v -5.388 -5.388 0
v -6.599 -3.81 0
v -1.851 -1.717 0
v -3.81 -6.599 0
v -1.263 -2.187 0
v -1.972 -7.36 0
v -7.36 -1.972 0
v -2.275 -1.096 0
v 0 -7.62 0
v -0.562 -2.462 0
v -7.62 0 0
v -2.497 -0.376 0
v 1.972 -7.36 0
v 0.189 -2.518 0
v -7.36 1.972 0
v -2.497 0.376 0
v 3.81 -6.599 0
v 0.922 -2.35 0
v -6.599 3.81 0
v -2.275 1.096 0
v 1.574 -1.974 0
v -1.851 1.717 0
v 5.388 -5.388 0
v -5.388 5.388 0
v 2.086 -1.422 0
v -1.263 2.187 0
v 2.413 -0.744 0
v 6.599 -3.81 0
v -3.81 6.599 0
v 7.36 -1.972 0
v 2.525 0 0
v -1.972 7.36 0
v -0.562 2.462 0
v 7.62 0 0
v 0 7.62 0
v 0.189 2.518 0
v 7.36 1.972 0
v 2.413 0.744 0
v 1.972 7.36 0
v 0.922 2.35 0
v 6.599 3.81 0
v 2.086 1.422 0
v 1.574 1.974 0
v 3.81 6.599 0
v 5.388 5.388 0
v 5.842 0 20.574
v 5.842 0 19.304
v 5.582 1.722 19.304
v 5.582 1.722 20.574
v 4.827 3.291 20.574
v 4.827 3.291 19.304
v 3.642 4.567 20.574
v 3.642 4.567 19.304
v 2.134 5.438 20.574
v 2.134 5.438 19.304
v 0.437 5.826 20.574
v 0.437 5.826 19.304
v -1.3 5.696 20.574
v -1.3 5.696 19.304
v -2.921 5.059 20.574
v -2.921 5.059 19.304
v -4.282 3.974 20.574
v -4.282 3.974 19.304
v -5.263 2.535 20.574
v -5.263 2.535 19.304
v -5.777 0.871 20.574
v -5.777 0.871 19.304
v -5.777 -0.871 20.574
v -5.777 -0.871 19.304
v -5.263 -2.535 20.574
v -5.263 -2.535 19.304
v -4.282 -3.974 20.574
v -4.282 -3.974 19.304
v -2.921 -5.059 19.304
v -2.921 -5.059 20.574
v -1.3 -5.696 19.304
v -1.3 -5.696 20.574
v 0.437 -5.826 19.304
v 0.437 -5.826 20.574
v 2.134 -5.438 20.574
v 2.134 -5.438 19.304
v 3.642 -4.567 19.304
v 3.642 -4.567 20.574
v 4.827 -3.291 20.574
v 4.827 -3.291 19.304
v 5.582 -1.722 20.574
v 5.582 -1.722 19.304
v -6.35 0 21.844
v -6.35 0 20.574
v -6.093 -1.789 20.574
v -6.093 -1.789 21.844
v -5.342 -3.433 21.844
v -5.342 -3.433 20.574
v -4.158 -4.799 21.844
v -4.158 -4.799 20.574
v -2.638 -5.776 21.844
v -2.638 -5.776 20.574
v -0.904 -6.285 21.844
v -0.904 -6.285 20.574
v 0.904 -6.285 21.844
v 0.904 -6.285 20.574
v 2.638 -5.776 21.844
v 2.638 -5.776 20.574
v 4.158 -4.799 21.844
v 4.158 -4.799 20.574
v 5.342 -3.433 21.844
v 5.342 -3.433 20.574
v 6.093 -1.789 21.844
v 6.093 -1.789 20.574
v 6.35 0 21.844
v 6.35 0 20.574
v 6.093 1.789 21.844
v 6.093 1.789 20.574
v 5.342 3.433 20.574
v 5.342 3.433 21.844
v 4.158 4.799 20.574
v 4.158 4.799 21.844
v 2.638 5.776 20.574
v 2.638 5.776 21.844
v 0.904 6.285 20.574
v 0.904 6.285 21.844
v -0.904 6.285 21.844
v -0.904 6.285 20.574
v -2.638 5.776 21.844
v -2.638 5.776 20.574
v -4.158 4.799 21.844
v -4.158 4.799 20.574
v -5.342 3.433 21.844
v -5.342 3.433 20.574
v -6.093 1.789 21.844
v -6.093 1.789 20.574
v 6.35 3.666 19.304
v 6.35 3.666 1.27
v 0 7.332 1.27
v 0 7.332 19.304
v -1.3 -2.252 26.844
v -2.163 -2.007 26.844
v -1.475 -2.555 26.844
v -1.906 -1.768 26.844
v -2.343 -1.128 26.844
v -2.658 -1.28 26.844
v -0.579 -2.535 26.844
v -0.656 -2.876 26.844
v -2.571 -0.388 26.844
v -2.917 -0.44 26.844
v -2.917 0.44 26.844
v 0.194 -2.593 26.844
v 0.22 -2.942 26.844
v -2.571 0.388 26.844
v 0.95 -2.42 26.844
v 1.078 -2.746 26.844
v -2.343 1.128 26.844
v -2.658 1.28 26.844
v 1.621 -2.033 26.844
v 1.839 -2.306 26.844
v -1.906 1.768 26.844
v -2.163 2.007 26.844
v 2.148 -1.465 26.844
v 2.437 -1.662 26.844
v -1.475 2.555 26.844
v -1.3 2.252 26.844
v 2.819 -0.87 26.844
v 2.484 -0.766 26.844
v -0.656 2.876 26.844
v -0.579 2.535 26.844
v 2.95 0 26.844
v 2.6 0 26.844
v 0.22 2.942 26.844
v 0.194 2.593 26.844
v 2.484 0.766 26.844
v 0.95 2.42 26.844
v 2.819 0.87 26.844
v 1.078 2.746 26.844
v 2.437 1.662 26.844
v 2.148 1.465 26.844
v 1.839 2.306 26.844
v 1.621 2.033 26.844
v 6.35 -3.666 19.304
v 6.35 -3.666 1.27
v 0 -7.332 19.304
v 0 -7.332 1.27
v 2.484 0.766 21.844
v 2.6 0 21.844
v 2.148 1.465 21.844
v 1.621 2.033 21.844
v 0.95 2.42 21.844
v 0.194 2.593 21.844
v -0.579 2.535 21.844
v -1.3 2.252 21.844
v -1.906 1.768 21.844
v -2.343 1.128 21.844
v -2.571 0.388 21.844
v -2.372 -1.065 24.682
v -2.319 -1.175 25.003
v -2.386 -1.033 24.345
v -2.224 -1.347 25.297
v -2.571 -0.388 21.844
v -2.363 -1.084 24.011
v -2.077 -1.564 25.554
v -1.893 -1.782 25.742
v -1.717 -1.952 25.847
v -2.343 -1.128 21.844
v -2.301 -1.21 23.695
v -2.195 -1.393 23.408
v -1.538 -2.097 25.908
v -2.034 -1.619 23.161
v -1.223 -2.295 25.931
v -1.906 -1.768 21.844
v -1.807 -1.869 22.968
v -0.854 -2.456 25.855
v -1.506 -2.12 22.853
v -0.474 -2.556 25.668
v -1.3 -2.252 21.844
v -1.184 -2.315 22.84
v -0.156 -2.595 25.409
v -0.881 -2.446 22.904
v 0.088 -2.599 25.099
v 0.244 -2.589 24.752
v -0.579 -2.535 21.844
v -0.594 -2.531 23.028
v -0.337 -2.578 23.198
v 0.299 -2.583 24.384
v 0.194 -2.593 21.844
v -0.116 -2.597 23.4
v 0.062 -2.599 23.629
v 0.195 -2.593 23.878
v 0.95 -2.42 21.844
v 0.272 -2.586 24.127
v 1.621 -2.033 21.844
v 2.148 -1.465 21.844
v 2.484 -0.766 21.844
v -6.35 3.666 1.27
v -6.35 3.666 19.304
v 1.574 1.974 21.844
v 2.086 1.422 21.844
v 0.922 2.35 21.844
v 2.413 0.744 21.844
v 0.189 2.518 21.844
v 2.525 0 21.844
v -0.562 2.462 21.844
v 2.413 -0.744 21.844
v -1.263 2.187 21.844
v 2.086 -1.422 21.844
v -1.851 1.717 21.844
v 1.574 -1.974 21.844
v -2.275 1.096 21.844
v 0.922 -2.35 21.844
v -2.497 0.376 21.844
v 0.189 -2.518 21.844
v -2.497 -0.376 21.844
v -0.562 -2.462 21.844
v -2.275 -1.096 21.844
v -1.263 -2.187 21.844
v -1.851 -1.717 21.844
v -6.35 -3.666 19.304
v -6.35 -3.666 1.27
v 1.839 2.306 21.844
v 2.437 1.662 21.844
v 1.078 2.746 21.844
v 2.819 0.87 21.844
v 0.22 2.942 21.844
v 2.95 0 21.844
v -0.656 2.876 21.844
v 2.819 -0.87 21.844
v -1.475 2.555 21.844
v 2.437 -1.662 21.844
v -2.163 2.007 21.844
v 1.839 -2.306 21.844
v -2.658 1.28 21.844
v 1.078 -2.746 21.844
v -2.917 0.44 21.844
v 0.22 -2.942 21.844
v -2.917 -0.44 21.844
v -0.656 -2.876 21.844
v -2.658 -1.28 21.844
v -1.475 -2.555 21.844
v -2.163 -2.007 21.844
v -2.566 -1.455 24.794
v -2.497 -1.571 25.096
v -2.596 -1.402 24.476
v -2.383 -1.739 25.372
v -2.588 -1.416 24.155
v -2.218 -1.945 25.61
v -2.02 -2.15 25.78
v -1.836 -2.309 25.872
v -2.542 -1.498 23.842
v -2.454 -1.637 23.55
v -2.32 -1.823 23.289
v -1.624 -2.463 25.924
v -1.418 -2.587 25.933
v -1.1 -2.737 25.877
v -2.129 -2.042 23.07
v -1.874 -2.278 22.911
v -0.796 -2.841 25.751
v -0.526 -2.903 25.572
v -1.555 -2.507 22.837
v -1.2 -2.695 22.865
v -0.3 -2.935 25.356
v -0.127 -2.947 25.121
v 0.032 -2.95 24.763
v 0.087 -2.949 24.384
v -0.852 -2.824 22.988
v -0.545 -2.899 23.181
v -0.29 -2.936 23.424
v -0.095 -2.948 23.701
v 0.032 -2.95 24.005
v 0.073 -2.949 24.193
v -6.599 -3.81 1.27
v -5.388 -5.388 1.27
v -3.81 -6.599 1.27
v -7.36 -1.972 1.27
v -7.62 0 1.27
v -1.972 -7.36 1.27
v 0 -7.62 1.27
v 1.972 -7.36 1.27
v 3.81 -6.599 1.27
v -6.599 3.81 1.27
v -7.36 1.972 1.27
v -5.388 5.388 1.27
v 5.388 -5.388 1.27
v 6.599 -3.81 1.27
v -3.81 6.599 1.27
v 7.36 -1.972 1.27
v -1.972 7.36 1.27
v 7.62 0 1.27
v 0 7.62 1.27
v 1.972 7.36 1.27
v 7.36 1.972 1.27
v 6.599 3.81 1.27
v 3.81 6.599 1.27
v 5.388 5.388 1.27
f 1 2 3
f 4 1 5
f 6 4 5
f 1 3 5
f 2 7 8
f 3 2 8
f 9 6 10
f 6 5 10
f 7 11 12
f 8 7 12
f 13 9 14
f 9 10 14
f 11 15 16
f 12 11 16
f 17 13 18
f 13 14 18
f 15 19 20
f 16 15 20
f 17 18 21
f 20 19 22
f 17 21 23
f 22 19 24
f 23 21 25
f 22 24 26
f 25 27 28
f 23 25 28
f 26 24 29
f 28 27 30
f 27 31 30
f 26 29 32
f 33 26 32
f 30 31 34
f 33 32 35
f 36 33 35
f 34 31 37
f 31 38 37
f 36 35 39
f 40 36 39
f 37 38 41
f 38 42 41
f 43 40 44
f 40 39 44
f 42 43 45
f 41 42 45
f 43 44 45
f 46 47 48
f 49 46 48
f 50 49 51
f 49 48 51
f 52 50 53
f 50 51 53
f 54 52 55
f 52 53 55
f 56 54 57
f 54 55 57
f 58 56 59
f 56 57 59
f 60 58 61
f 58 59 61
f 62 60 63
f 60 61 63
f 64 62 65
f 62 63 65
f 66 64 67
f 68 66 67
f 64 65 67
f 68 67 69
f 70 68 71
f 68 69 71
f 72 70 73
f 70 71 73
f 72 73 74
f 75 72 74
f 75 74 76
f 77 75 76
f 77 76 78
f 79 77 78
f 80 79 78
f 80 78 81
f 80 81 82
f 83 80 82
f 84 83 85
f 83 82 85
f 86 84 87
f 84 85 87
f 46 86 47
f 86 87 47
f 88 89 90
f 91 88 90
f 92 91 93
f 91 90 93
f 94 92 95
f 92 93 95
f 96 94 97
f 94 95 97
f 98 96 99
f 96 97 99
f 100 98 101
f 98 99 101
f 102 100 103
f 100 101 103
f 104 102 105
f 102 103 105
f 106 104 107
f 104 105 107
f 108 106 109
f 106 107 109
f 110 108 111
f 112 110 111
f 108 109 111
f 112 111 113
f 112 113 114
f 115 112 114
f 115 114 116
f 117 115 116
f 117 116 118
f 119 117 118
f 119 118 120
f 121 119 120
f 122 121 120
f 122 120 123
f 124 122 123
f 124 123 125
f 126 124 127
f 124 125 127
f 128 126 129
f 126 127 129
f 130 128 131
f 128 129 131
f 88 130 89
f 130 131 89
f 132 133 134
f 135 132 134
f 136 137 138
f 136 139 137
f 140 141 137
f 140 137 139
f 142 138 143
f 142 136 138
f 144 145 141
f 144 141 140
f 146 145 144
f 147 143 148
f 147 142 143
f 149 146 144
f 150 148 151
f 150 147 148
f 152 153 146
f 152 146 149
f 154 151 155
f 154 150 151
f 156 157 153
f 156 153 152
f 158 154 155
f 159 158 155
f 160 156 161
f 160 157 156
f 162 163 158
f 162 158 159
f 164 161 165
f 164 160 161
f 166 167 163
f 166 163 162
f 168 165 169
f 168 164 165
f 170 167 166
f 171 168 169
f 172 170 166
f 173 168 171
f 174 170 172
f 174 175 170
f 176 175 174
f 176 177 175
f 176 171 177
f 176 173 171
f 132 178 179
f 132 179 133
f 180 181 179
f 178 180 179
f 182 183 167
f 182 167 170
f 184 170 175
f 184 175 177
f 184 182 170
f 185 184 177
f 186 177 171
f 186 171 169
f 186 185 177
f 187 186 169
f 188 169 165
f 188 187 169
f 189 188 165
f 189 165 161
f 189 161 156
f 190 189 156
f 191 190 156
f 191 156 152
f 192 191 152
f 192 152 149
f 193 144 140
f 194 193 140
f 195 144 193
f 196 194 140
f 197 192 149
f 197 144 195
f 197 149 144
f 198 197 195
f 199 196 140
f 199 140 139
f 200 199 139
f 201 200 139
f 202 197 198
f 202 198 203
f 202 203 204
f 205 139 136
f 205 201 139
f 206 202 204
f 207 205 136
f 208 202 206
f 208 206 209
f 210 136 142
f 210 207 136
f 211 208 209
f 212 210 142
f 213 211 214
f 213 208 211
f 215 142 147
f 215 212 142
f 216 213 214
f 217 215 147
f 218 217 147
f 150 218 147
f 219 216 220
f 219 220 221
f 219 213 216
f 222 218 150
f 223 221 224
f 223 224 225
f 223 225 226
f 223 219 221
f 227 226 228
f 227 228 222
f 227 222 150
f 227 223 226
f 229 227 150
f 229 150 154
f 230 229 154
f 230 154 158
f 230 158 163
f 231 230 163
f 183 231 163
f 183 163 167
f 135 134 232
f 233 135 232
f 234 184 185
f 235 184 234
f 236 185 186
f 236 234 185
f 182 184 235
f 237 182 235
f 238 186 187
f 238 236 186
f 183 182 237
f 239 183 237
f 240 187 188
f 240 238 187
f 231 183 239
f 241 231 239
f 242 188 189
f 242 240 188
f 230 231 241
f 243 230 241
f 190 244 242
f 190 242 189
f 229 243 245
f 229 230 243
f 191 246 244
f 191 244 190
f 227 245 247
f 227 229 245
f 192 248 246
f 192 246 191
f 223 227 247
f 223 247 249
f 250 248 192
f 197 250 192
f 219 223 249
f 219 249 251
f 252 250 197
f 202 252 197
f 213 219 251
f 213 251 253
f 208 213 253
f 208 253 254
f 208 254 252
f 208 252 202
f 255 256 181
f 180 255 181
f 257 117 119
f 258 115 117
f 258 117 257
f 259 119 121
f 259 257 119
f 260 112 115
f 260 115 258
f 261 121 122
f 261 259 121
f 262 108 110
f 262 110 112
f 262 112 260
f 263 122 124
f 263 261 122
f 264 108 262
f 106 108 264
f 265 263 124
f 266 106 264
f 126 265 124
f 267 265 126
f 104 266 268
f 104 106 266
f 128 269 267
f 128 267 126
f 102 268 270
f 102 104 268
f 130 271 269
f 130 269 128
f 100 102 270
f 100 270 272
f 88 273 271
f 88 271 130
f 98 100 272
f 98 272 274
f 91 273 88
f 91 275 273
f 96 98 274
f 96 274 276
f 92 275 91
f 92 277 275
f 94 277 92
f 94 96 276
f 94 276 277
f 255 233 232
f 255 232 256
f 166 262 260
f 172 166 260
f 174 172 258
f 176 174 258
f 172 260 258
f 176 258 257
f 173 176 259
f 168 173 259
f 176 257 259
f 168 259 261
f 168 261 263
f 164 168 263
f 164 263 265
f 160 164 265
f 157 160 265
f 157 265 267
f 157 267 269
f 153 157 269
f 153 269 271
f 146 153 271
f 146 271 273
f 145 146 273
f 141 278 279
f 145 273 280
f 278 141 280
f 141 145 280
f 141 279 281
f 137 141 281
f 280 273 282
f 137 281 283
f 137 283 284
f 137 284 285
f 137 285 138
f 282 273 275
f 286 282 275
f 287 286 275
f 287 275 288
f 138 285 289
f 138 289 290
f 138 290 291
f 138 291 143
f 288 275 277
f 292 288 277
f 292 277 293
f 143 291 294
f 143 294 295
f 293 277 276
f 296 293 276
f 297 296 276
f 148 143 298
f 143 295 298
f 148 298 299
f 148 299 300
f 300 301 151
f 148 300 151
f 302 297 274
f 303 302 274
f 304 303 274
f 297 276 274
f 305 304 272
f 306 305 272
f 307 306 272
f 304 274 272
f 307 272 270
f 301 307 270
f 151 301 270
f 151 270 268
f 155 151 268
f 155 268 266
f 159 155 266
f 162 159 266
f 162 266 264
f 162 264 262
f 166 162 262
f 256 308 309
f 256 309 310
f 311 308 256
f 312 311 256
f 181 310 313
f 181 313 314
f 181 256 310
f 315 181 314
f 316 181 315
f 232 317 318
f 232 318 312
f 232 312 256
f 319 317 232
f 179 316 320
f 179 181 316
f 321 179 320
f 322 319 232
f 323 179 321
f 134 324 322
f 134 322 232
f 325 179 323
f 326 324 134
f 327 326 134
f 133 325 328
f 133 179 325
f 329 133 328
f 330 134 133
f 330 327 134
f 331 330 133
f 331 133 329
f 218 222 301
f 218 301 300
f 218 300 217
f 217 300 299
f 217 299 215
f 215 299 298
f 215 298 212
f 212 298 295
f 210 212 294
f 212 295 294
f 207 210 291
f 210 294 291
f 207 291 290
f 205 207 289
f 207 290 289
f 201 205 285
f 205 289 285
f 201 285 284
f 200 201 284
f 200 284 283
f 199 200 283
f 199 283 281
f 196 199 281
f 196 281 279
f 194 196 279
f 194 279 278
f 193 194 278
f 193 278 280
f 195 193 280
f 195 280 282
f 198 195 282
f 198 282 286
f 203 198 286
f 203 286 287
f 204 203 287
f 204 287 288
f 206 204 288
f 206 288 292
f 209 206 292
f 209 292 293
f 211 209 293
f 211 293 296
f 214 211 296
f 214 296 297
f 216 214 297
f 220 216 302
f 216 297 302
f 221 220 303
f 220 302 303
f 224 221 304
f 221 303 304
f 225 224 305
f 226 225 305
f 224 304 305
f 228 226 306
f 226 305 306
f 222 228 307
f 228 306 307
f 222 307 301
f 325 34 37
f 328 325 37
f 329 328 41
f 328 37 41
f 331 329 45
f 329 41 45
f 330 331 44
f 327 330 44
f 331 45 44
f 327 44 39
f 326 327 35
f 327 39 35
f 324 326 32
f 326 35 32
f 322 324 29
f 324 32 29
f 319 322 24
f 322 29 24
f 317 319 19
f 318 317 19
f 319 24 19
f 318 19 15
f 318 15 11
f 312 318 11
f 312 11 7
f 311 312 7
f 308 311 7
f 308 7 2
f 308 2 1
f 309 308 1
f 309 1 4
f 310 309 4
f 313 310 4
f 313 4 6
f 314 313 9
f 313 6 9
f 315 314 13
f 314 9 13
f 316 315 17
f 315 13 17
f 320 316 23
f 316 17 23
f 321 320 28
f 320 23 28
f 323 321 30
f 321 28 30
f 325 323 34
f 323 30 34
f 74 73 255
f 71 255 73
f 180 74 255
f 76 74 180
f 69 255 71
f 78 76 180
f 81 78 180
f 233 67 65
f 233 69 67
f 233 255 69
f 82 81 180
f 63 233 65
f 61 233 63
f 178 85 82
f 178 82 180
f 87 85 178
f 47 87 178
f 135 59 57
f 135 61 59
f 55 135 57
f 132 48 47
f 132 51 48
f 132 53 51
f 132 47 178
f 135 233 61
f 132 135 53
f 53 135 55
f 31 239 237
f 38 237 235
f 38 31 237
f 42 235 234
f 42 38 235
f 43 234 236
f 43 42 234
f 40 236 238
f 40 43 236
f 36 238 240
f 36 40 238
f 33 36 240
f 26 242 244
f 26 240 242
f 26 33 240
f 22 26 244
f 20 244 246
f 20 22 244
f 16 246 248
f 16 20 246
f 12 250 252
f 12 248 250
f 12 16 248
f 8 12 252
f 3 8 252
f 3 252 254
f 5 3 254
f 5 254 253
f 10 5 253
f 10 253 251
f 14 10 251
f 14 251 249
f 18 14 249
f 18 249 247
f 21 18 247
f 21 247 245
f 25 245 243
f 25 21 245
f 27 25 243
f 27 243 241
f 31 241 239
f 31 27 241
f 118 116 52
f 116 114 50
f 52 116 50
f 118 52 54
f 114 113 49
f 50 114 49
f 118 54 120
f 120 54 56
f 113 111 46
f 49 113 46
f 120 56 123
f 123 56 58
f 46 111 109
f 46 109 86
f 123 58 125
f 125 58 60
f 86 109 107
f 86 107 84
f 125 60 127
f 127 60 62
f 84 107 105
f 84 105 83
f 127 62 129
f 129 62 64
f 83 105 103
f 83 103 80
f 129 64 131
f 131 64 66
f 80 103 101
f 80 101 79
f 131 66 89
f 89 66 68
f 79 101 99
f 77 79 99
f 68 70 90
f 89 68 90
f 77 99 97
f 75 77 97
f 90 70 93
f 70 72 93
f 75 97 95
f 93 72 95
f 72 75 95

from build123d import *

# Parameters (mm, degrees)
BOSS_EXTRU_1_DEPTH      = 19.304
ESQUISSE2_R             = 7.62
BOSS_EXTRU_2_DEPTH      = 1.27
ESQUISSE3_R             = 5.842
BOSS_EXTRU_3_DEPTH      = 1.27
ESQUISSE4_R             = 6.35
BOSS_EXTRU_4_DEPTH      = 1.27
ESQUISSE5_R             = 2.525
ENL_V_MAT_EXTRU_1_DEPTH = 25.357527297
ESQUISSE7_R             = 2.95
ESQUISSE7_R_2           = 2.6
BOSS_EXTRU_6_DEPTH      = 5
ESQUISSE8_R             = 1.55
ENL_V_MAT_EXTRU_2_DEPTH = 5


with BuildPart() as part:
    # Esquisse1 → Boss.-Extru.1 (new body)
    with BuildSketch(Plane.XY):
        Polygon((0, 7.332348419), (-6.35, 3.666174209), (-6.35, -3.666174209), (0, -7.332348419), (6.35, -3.666174209), (6.35, 3.666174209), align=None)
    extrude(amount=BOSS_EXTRU_1_DEPTH)

    # Esquisse2 → Boss.-Extru.2 (add)
    with BuildSketch(Plane.XY):
        Circle(ESQUISSE2_R)
    extrude(amount=BOSS_EXTRU_2_DEPTH)

    # Esquisse3 → Boss.-Extru.3 (add)
    with BuildSketch(Plane.XY.offset(19.304)):
        Circle(ESQUISSE3_R)
    extrude(amount=BOSS_EXTRU_3_DEPTH)

    # Esquisse4 → Boss.-Extru.4 (add)
    with BuildSketch(Plane.XY.offset(20.574)):
        with Locations(Location((0, 0, 0), (0, 0, 180))):
            Circle(ESQUISSE4_R)
    extrude(amount=BOSS_EXTRU_4_DEPTH)

    # Esquisse5 → Enlèv. mat.-Extru.1 (cut, through all)
    with BuildSketch(Plane.XY):
        Circle(ESQUISSE5_R)
    extrude(amount=ENL_V_MAT_EXTRU_1_DEPTH, mode=Mode.SUBTRACT)

    # Esquisse7 → Boss.-Extru.6 (add)
    with BuildSketch(Plane.XY.offset(21.844)):
        Circle(ESQUISSE7_R)
        Circle(ESQUISSE7_R_2, mode=Mode.SUBTRACT)
    extrude(amount=BOSS_EXTRU_6_DEPTH)

    # Esquisse8 → Enlèv. mat.-Extru.2 (cut)
    with BuildSketch(Plane(origin=(-3.175, -5.499261314, 0), x_dir=(0.8660254037844417, -0.49999999999999495, 0), z_dir=(-0.49999999999999495, -0.8660254037844417, 0))):
        with Locations((0, 24.384)):
            Circle(ESQUISSE8_R)
    extrude(amount=-ENL_V_MAT_EXTRU_2_DEPTH, mode=Mode.SUBTRACT)


solid = part.part
